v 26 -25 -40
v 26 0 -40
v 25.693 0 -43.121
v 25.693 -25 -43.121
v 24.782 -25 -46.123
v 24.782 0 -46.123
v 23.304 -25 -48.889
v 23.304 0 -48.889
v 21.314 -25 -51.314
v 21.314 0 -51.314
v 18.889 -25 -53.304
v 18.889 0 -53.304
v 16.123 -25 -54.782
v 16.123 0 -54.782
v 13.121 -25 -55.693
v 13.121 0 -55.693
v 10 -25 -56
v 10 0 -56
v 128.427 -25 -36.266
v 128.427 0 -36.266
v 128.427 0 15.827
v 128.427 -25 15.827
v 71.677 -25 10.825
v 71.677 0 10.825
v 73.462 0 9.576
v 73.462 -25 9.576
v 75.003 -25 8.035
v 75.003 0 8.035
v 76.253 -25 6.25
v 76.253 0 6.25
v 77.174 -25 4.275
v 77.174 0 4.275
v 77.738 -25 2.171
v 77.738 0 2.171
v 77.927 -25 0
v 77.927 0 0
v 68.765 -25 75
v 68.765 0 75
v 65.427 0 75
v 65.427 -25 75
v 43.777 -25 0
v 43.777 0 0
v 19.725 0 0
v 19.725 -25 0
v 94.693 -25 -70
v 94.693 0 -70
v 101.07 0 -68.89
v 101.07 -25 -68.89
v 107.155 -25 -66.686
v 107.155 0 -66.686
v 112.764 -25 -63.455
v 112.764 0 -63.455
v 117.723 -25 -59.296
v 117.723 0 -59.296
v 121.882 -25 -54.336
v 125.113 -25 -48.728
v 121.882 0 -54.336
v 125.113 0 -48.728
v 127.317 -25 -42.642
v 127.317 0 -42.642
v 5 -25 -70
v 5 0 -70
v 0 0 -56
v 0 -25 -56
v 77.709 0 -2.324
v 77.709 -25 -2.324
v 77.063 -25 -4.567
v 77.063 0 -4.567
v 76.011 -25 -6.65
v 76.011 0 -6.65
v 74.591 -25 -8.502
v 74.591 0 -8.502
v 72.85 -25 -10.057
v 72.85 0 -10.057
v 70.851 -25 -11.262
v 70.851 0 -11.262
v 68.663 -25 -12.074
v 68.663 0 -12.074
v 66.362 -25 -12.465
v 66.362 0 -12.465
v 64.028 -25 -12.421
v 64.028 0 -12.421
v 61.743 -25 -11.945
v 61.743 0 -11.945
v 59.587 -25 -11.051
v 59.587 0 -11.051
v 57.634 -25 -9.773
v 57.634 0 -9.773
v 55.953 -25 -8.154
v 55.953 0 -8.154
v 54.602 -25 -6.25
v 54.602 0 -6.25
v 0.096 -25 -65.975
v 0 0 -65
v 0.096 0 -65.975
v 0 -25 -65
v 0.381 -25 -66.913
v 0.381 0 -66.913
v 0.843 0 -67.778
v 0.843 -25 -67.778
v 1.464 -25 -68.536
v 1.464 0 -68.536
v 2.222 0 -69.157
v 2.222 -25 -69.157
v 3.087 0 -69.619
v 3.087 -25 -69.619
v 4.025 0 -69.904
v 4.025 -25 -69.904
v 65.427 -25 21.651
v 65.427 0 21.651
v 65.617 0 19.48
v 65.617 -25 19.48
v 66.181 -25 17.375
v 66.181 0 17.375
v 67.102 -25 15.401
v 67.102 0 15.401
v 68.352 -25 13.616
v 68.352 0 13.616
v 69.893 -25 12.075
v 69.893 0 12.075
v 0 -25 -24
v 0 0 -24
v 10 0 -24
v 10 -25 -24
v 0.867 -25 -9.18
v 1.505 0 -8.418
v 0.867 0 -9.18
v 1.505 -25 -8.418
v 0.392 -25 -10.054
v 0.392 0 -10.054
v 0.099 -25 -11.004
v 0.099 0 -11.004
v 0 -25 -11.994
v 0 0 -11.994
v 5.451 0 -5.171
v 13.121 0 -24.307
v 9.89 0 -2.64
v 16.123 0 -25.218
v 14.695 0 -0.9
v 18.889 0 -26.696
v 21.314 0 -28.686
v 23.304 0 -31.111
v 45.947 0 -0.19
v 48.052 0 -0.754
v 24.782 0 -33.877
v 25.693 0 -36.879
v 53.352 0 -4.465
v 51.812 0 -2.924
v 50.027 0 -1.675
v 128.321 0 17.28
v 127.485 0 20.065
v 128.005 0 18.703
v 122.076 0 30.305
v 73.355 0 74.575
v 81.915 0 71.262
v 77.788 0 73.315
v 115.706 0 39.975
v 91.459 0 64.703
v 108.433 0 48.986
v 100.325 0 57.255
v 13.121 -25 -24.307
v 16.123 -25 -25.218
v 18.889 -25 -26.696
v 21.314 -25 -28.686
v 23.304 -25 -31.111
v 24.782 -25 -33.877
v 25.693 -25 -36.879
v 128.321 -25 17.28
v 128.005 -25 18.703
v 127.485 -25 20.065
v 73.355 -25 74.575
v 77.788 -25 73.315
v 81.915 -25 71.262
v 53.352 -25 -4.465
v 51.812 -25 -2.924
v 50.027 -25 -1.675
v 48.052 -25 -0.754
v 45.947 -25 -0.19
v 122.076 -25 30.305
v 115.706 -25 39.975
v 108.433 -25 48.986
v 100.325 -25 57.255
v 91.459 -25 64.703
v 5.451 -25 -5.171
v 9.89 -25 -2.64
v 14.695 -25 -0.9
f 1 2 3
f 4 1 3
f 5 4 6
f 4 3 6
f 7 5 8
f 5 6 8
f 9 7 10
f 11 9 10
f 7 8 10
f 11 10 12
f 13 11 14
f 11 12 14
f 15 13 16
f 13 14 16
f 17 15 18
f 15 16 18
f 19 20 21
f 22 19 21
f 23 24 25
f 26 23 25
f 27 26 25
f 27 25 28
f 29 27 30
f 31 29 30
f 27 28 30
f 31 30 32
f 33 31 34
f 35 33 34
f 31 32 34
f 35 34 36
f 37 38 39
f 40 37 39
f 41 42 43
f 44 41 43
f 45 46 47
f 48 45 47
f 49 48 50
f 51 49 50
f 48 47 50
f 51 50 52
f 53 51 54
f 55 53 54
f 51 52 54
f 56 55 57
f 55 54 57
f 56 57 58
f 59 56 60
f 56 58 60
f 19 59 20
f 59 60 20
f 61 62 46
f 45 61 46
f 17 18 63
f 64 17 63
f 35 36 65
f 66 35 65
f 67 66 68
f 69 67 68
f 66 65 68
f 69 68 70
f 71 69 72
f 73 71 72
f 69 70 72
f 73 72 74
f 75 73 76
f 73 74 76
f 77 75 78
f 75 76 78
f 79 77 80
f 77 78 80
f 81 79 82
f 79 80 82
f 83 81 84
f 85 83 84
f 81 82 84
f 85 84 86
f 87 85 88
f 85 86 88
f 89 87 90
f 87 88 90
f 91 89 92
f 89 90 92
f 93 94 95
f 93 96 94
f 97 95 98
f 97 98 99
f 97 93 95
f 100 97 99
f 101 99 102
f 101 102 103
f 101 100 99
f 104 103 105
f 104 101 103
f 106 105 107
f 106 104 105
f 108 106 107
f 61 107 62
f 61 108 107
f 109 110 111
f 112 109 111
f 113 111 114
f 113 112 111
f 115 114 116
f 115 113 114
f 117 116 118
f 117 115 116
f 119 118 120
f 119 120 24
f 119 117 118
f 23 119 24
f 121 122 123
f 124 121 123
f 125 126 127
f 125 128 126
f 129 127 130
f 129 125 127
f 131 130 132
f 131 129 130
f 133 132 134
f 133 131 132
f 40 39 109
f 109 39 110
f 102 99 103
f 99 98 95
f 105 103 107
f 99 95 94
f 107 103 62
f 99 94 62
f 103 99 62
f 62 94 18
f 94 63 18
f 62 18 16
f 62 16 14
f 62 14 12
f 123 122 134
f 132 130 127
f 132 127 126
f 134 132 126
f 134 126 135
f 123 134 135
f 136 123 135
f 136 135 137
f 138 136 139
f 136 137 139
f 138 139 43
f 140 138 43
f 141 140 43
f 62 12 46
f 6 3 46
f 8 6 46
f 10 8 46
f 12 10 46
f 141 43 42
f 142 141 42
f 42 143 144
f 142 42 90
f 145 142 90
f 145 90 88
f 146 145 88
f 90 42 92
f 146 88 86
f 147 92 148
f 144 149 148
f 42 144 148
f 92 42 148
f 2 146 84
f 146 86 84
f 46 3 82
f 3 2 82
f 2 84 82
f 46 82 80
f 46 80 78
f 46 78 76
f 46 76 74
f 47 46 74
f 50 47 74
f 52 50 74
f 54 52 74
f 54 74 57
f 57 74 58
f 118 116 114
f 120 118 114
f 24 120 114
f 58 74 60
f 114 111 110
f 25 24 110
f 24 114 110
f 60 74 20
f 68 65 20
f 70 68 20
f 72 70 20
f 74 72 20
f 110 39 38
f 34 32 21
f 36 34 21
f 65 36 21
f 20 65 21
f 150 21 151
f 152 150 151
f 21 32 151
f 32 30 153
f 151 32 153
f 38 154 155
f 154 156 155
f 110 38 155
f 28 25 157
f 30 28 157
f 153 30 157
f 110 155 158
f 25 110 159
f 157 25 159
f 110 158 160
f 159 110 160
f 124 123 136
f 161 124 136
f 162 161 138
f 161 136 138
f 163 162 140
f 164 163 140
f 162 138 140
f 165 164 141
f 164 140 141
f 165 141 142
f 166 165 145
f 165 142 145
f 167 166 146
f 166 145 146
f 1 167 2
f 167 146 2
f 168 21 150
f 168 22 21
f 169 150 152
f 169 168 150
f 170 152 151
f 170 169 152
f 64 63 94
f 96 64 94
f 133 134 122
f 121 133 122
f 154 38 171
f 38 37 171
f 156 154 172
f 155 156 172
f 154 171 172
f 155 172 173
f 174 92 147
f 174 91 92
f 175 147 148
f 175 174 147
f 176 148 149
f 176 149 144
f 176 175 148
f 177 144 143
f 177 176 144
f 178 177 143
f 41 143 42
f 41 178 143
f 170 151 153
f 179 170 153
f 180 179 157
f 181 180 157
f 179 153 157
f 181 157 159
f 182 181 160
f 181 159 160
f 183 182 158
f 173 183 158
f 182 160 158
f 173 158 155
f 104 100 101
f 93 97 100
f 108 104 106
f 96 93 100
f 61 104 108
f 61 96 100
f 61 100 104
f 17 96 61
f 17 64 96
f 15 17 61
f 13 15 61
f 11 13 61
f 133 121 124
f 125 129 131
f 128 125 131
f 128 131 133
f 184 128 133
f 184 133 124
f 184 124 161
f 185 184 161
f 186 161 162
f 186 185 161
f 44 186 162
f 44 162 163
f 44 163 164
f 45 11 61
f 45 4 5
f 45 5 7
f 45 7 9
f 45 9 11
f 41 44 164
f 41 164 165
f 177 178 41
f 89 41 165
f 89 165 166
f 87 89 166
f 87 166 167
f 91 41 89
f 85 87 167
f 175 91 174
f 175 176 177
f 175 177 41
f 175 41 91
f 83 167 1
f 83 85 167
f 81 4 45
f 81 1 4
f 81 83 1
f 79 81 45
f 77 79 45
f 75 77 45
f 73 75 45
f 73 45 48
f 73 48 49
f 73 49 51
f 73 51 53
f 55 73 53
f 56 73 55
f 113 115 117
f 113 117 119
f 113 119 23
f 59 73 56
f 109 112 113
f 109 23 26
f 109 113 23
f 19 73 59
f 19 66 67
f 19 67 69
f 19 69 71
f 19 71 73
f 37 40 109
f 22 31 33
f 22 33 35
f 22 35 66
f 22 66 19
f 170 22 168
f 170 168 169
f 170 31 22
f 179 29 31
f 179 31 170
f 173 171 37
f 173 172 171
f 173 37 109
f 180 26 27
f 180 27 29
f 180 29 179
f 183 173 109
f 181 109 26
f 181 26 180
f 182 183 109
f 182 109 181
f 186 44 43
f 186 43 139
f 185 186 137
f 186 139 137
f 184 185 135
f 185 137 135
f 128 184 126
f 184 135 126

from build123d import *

# Parameters (mm, degrees)
F1_DEPTH = 25
F2_R     = 12.5
F3_R     = 12.5
F4_R     = 25
F5_R     = 5
F6_R     = 5
F7_R     = 10


with BuildPart() as f1:
    # F0 (on Front) → F1 (new body)
    with BuildSketch(Plane.XZ):
        with BuildLine():
            Line((25.221193, 0), (19.72456, 0))
            ThreePointArc((19.72456, 0), (8.907216, -3.116178), (0, -10))
            Line((0, -10), (0, -24))
            Line((0, -24), (10, -24))
            ThreePointArc((10, -24), (21.313708, -28.686292), (26, -40))
            ThreePointArc((26, -40), (21.313708, -51.313708), (10, -56))
            Line((10, -56), (0, -56))
            Line((0, -56), (0, -70))
            Line((0, -70), (88.427416, -70))
            Line((88.427416, -70), (94.69316, -70))
            ThreePointArc((94.69316, -70), (117.723239, -59.295823), (128.427416, -36.265744))
            Line((128.427416, -36.265744), (128.427416, -30))
            Line((128.427416, -30), (128.427416, 18))
            ThreePointArc((128.427416, 18), (106.677114, 50.916386), (75.427416, 75))
            Line((75.427416, 75), (65.427416, 75))
            Line((65.427416, 75), (65.427416, 12.5))
            ThreePointArc((65.427416, 12.5), (74.266251, 8.838835), (77.927416, 0))
            ThreePointArc((77.927416, 0), (65.427416, -12.5), (52.927416, 0))
            Line((52.927416, 0), (25.221193, 0))
        make_face()
    extrude(amount=F1_DEPTH)

    # F2
    f2_edges = [f1.edges().sort_by_distance(p)[0] for p in [
        (65.427416, -12.5, 12.5),
    ]]
    fillet(f2_edges, radius=F2_R)

    # F3
    f3_edges = [f1.edges().sort_by_distance(p)[0] for p in [
        (52.927416, -12.5, 0),
    ]]
    fillet(f3_edges, radius=F3_R)

    # F4
    f4_edges = [f1.edges().sort_by_distance(p)[0] for p in [
        (75.427416, -12.5, 75),
    ]]
    fillet(f4_edges, radius=F4_R)

    # F5
    f5_edges = [f1.edges().sort_by_distance(p)[0] for p in [
        (0, -12.5, -10),
    ]]
    fillet(f5_edges, radius=F5_R)

    # F6
    f6_edges = [f1.edges().sort_by_distance(p)[0] for p in [
        (0, -12.5, -70),
    ]]
    fillet(f6_edges, radius=F6_R)

    # F7
    f7_edges = [f1.edges().sort_by_distance(p)[0] for p in [
        (128.427416, -12.5, 18),
    ]]
    fillet(f7_edges, radius=F7_R)


solid = f1.part
